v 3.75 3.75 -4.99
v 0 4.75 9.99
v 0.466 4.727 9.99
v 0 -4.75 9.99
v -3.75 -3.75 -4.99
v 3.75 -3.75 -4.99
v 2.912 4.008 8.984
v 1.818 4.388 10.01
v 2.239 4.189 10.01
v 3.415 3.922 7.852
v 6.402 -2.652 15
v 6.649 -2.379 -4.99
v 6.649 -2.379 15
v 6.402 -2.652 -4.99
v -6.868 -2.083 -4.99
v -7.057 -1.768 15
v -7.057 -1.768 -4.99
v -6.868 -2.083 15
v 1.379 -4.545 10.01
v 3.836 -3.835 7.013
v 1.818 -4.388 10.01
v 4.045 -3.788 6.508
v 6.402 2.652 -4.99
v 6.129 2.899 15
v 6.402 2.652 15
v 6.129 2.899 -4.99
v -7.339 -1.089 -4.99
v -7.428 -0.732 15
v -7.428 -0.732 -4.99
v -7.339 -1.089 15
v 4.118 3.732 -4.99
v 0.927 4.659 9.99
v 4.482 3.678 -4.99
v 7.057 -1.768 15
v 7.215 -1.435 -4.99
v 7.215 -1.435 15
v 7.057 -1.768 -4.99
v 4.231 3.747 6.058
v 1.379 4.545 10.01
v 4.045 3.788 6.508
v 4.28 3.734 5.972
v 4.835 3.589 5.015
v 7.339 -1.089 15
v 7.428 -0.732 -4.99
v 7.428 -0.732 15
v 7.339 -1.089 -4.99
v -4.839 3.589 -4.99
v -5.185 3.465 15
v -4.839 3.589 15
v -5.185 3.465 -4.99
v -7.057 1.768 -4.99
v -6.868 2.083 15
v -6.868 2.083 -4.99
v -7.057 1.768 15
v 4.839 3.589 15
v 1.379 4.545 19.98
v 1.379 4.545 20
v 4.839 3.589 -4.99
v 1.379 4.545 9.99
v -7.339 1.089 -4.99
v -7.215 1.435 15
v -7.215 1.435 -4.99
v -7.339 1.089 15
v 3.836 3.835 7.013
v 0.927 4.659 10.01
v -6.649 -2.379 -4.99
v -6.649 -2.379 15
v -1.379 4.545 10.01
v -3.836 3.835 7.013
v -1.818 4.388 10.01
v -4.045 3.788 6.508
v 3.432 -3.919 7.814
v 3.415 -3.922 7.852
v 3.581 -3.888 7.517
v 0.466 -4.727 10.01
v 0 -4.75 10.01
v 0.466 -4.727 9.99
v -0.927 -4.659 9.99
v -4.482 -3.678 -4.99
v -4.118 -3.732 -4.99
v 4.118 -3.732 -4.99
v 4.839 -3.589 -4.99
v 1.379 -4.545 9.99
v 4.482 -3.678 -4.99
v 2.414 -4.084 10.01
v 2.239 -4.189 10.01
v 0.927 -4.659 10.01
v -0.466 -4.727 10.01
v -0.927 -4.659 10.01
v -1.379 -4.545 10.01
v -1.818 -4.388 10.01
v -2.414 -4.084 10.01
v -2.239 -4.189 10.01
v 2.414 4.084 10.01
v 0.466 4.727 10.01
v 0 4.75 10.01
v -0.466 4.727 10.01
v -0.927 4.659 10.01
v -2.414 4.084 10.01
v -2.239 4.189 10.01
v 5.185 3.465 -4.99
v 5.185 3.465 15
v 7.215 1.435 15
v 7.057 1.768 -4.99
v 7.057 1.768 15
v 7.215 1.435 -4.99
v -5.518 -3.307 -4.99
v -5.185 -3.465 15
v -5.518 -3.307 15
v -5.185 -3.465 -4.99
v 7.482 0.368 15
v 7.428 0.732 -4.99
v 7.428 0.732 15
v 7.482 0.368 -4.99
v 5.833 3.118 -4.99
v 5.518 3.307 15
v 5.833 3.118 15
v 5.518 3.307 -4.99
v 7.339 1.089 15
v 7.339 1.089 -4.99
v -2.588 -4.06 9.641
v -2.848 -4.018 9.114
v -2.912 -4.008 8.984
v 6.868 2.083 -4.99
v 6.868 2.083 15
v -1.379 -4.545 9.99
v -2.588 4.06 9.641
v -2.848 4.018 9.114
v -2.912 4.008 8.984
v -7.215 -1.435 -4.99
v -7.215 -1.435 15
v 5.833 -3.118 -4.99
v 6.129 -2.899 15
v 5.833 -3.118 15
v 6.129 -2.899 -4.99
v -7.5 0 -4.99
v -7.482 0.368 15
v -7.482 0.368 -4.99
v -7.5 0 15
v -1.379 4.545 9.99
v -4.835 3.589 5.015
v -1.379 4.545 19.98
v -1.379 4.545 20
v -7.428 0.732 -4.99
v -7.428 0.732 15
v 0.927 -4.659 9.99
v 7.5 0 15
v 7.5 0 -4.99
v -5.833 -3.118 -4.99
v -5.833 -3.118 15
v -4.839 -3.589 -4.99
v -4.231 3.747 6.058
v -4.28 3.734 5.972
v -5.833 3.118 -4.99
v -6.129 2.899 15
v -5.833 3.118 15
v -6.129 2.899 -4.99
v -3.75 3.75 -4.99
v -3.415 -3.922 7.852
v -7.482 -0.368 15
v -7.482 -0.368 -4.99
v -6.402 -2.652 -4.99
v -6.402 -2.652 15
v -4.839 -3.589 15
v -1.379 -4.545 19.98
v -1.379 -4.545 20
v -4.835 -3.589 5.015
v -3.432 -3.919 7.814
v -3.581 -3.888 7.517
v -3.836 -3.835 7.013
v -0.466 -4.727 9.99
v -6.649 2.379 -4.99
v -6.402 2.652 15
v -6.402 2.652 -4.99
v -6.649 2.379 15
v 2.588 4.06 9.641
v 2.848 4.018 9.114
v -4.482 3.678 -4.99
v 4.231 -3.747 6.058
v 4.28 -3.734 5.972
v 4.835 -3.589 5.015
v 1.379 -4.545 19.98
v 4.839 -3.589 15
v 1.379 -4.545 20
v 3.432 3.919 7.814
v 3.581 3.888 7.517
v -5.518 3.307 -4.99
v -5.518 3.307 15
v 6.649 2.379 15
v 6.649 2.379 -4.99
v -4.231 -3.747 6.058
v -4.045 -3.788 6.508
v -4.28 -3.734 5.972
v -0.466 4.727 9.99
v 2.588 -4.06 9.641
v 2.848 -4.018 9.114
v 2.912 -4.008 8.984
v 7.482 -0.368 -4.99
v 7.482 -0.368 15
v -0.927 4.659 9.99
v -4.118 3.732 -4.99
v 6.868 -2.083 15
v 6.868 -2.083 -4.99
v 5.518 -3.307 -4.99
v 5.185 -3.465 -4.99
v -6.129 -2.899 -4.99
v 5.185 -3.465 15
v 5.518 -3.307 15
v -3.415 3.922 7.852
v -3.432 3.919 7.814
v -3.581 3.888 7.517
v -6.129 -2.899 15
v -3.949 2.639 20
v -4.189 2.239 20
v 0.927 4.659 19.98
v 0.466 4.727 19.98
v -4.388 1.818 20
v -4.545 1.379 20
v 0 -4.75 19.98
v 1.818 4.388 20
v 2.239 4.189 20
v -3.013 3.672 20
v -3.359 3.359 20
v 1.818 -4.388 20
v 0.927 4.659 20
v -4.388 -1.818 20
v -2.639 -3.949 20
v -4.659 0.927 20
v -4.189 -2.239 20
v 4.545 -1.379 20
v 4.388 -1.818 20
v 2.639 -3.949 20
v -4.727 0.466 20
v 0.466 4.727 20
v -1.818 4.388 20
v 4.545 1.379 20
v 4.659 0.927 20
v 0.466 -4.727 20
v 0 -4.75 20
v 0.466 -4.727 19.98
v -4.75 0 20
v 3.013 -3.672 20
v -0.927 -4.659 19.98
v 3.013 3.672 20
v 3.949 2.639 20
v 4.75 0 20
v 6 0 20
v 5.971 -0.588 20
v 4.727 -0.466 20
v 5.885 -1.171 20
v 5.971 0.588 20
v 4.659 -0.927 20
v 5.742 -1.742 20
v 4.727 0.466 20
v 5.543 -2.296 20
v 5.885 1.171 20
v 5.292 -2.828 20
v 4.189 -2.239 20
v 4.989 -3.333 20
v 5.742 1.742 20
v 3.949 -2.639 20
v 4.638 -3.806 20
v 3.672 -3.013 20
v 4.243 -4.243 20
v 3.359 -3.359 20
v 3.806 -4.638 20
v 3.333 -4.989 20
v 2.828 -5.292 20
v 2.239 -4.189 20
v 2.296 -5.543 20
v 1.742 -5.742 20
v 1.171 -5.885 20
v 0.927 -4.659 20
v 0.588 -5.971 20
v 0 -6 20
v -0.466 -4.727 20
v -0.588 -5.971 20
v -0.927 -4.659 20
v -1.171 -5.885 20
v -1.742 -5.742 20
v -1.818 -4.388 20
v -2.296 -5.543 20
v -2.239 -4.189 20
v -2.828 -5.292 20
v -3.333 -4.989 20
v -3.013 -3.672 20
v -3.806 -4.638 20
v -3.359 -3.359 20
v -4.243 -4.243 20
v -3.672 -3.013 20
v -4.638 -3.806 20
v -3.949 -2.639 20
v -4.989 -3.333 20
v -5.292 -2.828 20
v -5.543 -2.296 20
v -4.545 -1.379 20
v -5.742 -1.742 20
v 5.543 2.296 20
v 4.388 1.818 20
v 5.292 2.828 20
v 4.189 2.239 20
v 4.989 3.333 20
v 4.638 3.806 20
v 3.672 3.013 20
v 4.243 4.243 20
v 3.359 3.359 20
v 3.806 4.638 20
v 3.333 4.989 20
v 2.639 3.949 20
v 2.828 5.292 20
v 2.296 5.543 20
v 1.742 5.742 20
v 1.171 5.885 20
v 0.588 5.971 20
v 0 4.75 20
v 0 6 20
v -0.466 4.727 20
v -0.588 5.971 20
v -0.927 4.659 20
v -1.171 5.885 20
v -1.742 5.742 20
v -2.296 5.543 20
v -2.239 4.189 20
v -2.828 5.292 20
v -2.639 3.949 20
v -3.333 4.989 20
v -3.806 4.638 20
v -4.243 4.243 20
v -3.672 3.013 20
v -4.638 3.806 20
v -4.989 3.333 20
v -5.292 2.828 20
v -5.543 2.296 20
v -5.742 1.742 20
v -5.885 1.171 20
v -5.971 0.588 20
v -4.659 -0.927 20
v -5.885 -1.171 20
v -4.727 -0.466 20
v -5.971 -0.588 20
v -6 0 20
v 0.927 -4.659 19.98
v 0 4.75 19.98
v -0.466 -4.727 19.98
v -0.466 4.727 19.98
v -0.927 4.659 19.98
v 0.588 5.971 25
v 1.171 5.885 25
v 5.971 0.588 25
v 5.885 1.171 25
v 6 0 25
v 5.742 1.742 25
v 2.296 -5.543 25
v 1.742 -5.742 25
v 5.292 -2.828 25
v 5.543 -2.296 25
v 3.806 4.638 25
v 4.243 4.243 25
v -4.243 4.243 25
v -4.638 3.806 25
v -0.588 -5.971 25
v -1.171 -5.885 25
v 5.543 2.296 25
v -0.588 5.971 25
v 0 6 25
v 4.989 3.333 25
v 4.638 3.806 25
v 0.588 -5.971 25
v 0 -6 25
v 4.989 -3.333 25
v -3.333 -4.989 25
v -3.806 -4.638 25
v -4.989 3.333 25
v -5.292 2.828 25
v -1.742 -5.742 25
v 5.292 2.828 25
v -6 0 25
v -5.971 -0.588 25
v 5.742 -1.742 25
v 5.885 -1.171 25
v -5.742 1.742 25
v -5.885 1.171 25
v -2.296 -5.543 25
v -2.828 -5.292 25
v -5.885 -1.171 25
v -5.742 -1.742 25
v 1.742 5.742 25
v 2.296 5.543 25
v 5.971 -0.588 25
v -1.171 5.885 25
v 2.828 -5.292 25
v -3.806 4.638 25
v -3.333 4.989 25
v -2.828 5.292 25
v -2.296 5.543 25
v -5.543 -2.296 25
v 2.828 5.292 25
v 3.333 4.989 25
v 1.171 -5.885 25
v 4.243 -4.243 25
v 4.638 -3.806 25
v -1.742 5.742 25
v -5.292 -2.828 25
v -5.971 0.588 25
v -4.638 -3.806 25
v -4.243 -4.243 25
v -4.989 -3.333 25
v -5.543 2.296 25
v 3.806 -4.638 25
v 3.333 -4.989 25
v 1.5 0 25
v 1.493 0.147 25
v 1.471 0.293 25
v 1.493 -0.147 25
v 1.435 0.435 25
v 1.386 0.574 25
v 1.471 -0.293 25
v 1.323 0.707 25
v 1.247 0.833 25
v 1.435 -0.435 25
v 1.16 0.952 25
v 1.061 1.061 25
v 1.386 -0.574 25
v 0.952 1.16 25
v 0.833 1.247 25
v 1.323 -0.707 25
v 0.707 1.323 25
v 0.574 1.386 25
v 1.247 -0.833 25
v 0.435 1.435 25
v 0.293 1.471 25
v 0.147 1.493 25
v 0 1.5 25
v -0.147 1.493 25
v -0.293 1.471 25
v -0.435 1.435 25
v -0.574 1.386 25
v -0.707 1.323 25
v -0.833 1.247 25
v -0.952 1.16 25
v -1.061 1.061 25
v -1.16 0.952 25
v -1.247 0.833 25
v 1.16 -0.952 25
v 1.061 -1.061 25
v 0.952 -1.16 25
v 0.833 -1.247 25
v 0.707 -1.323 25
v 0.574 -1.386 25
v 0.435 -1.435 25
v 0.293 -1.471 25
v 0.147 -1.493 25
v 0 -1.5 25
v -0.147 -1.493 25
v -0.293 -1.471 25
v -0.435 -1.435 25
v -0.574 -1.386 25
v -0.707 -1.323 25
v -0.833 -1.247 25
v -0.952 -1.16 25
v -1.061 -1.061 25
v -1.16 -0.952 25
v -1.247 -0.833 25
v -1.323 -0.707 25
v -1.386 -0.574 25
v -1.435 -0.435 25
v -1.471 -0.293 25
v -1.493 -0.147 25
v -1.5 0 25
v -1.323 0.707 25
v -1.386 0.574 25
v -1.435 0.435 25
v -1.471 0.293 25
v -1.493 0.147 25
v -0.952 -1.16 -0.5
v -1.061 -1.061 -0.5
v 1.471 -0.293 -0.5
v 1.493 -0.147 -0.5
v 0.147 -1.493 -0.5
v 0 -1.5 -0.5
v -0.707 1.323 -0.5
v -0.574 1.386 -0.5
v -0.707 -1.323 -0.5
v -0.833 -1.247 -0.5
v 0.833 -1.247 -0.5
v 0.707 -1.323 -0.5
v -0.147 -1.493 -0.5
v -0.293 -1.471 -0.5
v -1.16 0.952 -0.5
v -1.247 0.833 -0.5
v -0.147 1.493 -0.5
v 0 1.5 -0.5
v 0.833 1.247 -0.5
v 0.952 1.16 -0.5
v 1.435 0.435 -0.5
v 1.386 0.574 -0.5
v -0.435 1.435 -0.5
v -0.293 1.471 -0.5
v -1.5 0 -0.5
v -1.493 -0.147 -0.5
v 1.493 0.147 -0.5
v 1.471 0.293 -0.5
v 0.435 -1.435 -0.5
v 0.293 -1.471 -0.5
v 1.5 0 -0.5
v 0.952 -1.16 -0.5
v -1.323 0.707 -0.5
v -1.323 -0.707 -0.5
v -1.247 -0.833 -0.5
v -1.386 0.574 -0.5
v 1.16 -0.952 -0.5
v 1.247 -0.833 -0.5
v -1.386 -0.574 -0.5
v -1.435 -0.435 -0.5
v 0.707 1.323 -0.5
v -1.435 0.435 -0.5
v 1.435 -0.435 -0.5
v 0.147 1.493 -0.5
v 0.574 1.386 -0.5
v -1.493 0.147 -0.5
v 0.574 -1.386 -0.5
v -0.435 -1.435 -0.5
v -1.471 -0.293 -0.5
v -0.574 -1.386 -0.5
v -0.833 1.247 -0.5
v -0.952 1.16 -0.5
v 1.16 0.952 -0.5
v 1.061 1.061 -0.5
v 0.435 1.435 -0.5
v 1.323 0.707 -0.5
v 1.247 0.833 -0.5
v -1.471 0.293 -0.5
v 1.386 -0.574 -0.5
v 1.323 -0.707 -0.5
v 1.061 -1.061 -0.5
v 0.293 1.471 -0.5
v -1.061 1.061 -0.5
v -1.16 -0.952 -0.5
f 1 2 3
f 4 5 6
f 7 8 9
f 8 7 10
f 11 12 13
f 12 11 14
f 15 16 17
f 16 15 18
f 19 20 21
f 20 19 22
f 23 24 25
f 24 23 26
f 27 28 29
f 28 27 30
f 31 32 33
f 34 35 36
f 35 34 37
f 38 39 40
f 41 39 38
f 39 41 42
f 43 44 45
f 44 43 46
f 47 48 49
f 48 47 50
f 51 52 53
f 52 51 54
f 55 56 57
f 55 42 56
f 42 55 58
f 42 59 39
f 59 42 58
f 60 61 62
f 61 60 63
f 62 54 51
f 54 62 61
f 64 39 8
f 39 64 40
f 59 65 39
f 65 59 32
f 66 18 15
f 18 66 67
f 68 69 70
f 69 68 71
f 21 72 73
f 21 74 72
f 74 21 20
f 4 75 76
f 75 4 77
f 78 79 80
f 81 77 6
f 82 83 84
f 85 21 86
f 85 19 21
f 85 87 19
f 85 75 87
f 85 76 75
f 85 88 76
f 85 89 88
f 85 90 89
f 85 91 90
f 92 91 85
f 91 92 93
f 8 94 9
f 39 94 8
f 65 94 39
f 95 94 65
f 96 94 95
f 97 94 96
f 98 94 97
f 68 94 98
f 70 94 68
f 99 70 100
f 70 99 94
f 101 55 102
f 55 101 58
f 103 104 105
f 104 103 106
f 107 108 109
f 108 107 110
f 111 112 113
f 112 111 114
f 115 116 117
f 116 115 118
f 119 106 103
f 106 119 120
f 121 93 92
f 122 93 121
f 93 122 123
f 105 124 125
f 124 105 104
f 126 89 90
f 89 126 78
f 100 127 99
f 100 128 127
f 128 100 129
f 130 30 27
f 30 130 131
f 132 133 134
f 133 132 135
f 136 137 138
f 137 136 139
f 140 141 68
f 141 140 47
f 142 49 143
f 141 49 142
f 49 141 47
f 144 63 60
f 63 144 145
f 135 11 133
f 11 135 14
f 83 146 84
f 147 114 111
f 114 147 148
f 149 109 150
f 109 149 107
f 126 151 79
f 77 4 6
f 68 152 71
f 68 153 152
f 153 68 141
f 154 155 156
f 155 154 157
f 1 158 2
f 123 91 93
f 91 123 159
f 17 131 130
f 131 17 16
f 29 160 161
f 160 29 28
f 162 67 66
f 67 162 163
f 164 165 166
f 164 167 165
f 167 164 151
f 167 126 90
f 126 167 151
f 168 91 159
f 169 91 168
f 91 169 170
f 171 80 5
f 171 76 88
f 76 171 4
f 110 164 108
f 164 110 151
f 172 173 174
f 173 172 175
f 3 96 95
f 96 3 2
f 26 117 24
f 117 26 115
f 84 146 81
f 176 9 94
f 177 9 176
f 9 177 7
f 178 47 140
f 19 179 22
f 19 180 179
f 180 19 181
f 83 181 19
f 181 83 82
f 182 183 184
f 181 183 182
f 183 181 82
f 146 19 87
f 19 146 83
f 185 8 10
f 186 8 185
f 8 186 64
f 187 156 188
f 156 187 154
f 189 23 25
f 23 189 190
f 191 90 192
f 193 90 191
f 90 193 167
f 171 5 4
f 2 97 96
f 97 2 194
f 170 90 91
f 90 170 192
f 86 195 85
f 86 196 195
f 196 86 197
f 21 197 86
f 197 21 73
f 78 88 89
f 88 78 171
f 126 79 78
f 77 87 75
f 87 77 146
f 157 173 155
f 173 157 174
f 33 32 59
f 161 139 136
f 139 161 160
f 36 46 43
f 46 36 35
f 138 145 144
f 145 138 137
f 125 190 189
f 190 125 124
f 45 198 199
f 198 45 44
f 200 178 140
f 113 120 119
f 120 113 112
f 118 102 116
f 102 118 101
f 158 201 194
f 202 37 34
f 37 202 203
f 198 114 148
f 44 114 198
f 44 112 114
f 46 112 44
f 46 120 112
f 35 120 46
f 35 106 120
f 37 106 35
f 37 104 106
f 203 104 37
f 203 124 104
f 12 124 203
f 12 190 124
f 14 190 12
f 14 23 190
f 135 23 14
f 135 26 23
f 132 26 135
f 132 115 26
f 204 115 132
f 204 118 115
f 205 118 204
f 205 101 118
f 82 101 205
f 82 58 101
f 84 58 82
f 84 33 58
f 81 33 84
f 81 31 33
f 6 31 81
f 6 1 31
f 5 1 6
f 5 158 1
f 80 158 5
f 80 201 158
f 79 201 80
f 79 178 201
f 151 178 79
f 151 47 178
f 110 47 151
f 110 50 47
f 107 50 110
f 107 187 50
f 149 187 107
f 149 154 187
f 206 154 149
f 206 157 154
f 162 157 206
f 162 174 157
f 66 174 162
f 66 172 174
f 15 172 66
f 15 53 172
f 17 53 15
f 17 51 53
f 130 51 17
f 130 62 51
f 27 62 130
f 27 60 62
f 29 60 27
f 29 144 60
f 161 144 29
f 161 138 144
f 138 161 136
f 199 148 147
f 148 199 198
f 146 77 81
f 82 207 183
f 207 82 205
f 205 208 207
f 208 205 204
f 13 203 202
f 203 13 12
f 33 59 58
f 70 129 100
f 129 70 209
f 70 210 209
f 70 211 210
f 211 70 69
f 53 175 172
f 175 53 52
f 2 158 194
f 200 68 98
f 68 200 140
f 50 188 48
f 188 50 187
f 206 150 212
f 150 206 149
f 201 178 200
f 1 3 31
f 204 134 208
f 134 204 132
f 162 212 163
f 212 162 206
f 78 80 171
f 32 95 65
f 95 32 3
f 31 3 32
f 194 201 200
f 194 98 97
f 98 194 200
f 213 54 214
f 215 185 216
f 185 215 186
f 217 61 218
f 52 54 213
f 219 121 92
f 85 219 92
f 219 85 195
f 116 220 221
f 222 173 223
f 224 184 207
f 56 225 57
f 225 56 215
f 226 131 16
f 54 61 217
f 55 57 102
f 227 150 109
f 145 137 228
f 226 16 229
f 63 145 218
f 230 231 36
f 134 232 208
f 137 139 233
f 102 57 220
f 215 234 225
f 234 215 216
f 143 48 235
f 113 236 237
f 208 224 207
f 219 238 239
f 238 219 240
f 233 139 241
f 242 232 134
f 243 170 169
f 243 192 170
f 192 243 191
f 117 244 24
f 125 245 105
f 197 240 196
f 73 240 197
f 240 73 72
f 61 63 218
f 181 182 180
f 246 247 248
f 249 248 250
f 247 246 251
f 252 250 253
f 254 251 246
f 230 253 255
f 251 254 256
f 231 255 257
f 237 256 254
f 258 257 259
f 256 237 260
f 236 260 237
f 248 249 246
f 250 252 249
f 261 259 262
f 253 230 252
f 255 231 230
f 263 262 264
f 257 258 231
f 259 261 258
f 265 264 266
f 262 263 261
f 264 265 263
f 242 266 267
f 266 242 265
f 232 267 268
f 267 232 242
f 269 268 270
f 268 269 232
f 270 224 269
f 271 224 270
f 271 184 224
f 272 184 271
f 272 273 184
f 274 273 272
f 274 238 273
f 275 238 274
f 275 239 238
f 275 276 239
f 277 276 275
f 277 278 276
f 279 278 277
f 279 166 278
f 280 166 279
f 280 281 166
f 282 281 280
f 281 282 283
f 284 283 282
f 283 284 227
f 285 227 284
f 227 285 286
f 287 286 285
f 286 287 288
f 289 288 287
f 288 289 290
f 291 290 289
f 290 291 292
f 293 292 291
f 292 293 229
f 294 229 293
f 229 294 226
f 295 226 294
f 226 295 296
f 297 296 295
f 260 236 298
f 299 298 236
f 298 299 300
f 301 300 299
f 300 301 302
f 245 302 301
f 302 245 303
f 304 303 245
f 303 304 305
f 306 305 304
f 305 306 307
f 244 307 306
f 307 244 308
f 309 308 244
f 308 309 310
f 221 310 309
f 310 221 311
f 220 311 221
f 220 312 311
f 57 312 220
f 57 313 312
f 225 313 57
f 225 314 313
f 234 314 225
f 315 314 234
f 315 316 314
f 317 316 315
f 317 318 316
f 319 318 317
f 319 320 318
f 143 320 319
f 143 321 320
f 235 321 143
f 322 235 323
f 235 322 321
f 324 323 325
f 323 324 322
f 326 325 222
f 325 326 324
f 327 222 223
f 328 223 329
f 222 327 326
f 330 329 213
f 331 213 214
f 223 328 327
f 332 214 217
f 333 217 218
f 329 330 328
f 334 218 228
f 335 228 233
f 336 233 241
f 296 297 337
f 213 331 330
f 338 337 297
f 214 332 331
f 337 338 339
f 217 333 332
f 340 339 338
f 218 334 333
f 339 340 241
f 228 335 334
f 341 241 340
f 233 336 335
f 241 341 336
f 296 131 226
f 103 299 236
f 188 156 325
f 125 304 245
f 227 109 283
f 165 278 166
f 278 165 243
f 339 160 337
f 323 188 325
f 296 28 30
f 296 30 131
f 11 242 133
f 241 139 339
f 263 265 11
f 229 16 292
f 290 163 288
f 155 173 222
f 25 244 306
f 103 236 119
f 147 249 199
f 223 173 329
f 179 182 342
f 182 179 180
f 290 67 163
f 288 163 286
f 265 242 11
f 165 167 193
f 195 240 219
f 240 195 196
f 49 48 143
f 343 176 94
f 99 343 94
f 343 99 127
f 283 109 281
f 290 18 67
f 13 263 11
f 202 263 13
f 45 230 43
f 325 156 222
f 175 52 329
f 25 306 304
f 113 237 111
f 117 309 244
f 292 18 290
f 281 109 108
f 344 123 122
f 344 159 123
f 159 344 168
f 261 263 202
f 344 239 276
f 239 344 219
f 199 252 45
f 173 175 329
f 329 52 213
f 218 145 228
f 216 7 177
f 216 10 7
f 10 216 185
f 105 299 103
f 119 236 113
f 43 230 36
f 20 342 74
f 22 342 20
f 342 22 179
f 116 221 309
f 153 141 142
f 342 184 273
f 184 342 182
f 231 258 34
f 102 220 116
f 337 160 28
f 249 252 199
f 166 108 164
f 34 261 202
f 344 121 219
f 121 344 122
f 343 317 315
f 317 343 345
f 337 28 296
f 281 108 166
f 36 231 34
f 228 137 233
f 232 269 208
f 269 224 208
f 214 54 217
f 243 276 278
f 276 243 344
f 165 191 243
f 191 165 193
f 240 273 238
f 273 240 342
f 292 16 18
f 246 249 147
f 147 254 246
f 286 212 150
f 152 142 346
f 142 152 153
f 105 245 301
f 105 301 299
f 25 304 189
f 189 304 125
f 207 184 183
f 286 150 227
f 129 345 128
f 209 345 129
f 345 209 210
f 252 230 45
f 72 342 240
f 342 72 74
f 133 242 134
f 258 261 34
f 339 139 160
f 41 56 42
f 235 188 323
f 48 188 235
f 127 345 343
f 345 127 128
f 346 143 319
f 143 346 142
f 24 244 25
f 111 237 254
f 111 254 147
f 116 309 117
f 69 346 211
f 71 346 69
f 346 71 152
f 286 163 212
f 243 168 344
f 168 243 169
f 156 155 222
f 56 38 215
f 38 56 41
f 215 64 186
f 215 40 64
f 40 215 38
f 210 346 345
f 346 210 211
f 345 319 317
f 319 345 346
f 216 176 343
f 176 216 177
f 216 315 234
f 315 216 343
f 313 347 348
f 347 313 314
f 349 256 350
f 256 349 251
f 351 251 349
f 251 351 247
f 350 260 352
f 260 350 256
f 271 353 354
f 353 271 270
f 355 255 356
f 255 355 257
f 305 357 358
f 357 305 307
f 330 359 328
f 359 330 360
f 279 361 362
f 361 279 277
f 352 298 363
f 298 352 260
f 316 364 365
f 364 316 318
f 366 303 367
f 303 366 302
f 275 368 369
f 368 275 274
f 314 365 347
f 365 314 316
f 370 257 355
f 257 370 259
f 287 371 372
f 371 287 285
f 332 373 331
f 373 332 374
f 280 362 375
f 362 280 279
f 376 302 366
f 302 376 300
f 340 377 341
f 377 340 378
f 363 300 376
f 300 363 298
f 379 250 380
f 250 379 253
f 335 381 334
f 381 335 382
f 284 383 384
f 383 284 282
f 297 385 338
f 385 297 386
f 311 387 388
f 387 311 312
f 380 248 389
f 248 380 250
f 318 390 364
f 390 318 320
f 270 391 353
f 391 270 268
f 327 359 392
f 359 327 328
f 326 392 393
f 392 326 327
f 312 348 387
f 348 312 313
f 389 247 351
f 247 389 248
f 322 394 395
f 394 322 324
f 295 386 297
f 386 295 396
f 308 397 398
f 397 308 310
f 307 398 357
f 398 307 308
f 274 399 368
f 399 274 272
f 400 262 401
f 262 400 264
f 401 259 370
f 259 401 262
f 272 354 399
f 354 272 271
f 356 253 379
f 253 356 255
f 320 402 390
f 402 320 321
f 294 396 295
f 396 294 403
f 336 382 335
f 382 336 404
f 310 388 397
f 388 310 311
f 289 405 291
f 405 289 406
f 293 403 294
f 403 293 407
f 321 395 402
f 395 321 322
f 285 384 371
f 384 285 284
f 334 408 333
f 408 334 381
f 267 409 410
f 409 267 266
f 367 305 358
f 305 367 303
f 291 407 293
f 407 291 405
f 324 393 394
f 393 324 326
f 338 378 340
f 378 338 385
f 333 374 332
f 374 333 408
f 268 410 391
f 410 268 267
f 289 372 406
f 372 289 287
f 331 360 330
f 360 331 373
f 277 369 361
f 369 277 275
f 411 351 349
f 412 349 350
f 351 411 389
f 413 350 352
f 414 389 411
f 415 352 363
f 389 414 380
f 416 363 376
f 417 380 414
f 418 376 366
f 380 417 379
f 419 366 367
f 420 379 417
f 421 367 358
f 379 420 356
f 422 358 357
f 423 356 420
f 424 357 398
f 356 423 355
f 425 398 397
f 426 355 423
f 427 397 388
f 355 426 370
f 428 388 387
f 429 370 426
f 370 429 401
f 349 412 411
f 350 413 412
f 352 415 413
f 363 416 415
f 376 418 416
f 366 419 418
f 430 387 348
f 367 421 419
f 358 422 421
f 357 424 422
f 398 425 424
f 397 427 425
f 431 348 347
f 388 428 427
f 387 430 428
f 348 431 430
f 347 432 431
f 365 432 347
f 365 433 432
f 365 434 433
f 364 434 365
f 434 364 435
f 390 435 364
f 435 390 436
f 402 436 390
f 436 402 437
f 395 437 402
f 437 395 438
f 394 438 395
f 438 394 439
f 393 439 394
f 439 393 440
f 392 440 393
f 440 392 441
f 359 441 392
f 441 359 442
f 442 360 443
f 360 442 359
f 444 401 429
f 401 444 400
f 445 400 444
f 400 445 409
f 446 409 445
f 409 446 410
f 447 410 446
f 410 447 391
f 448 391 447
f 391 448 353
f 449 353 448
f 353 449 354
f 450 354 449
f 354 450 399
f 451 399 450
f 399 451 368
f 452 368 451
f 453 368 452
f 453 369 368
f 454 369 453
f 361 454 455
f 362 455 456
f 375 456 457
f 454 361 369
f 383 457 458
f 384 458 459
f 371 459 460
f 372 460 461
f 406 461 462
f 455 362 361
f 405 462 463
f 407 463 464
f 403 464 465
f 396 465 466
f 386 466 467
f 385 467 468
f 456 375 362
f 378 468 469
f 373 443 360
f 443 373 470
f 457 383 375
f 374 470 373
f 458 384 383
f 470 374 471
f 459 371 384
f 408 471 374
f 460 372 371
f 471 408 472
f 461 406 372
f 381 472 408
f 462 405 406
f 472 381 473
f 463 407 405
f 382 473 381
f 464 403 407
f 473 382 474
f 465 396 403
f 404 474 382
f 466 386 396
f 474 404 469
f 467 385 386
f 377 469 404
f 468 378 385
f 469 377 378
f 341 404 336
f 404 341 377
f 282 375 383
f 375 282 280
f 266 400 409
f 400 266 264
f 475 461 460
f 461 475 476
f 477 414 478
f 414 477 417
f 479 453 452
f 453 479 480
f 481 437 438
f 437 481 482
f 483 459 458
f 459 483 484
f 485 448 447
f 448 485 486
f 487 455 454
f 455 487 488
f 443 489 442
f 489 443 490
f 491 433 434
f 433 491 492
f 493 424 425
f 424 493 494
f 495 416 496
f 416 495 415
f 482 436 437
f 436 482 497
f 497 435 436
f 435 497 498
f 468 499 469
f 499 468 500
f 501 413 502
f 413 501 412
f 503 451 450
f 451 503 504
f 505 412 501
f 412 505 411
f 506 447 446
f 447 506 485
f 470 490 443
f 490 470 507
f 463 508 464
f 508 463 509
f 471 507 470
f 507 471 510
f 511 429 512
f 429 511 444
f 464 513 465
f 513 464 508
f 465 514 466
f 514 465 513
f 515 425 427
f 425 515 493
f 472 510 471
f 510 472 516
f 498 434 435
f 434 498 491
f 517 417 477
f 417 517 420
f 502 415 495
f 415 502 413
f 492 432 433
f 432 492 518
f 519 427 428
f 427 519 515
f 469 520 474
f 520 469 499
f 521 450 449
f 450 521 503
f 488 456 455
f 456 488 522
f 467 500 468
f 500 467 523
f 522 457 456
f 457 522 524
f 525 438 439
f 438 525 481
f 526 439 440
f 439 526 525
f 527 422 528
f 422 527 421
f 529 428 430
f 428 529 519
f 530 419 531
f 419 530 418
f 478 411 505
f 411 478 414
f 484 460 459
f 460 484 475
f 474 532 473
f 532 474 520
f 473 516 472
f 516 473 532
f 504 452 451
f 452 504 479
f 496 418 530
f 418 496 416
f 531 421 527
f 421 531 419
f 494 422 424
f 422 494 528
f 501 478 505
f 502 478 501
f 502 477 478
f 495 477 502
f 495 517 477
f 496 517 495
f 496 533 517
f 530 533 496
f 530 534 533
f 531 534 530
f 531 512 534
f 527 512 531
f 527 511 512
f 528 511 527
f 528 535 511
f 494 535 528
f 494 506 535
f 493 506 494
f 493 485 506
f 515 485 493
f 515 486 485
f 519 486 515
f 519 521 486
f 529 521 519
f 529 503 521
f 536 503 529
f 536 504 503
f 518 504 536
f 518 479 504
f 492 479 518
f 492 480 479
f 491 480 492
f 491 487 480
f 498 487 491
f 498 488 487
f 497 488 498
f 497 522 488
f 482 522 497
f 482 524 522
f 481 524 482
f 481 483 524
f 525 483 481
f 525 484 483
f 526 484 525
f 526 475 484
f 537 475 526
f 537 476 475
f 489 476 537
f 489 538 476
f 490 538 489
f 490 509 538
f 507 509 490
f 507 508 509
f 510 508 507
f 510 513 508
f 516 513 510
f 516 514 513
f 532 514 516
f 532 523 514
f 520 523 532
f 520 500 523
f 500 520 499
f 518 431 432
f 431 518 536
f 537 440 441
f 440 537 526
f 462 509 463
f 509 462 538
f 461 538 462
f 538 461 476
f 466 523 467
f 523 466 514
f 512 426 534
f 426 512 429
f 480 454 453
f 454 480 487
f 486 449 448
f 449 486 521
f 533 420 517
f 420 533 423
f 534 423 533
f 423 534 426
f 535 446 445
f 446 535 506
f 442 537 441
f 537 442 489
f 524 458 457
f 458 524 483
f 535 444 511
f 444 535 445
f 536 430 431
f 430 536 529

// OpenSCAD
// Straight hose-barb reducer: 8 mm tubing (barbs) -> 5 mm tubing (barbs)
// Print orientation: standing upright along Z, centred on origin in X/Y

$fn = 64;

// ---- Dimensions (mm) ----
tube_d1      = 8;    // inner diameter of larger tubing
tube_d2      = 5;    // inner diameter of smaller tubing
bore_d       = 3;    // through-bore diameter
barb_h1      = 10;   // height of each 8 mm barb
barb_od1_bot = 7.5;  // outer diameter of 8 mm barb at bottom
barb_od1_top = 9.5;  // outer diameter of 8 mm barb at top
collar_d     = 12;   // collar diameter (z = 20 to 25)
barb_h2      = 8;    // height of each 5 mm barb
barb_od2_bot = 6.5;  // outer diameter of 5 mm barb at bottom
barb_od2_top = 5.0;  // outer diameter of 5 mm barb at top
eps          = 0.5;  // overlap for clean boolean cuts

// ---- Derived ----
z_barbs1 = 20;       // bottom of collar
z_barbs2 = 41;       // top of second barb set
overlap  = 0.01;     // small overlap between adjacent barbs

module barb1() {
    // Sawtooth profile in XZ, extruded around Z axis
    r_bot = barb_od1_bot / 2;
    r_top = barb_od1_top / 2;
    hull() {
        for (s = [-1, 1])
            translate([s * r_bot, 0, 0])
                linear_extrude(height = barb_h1, center = true)
                    circle(r = r_bot);
        translate([0, 0, barb_h1 - overlap])
            linear_extrude(height = overlap + 0.01, center = true)
                circle(r = r_top);
    }
}

module barb2() {
    // Shrinking sawtooth profile, stepped back out at the top
    r_bot = barb_od2_bot / 2;
    r_top = barb_od2_top / 2;
    hull() {
        for (s = [-1, 1])
            translate([s * r_bot, 0, 0])
                linear_extrude(height = barb_h2, center = true)
                    circle(r = r_bot);
        translate([0, 0, barb_h2])
            linear_extrude(height = 0.01, center = true)
                circle(r = r_top);
        translate([0, 0, barb_h2])
            linear_extrude(height = barb_h2 * 2 + 0.01, center = true)
                circle(r = r_bot);
    }
}

difference() {
    union() {
        for (i = [0, 1])
            translate([0, 0, i * (barb_h1 - overlap) + overlap])
                barb1();
        translate([0, 0, z_barbs1])
            cylinder(d = collar_d, h = 5);
        for (i = [0, 1])
            translate([0, 0, i * (barb_h2 - overlap) + overlap])
                barb2();
    }
    translate([0, 0, -eps])
        cylinder(d = bore_d, h = z_barbs2 + 2 * eps);
}
